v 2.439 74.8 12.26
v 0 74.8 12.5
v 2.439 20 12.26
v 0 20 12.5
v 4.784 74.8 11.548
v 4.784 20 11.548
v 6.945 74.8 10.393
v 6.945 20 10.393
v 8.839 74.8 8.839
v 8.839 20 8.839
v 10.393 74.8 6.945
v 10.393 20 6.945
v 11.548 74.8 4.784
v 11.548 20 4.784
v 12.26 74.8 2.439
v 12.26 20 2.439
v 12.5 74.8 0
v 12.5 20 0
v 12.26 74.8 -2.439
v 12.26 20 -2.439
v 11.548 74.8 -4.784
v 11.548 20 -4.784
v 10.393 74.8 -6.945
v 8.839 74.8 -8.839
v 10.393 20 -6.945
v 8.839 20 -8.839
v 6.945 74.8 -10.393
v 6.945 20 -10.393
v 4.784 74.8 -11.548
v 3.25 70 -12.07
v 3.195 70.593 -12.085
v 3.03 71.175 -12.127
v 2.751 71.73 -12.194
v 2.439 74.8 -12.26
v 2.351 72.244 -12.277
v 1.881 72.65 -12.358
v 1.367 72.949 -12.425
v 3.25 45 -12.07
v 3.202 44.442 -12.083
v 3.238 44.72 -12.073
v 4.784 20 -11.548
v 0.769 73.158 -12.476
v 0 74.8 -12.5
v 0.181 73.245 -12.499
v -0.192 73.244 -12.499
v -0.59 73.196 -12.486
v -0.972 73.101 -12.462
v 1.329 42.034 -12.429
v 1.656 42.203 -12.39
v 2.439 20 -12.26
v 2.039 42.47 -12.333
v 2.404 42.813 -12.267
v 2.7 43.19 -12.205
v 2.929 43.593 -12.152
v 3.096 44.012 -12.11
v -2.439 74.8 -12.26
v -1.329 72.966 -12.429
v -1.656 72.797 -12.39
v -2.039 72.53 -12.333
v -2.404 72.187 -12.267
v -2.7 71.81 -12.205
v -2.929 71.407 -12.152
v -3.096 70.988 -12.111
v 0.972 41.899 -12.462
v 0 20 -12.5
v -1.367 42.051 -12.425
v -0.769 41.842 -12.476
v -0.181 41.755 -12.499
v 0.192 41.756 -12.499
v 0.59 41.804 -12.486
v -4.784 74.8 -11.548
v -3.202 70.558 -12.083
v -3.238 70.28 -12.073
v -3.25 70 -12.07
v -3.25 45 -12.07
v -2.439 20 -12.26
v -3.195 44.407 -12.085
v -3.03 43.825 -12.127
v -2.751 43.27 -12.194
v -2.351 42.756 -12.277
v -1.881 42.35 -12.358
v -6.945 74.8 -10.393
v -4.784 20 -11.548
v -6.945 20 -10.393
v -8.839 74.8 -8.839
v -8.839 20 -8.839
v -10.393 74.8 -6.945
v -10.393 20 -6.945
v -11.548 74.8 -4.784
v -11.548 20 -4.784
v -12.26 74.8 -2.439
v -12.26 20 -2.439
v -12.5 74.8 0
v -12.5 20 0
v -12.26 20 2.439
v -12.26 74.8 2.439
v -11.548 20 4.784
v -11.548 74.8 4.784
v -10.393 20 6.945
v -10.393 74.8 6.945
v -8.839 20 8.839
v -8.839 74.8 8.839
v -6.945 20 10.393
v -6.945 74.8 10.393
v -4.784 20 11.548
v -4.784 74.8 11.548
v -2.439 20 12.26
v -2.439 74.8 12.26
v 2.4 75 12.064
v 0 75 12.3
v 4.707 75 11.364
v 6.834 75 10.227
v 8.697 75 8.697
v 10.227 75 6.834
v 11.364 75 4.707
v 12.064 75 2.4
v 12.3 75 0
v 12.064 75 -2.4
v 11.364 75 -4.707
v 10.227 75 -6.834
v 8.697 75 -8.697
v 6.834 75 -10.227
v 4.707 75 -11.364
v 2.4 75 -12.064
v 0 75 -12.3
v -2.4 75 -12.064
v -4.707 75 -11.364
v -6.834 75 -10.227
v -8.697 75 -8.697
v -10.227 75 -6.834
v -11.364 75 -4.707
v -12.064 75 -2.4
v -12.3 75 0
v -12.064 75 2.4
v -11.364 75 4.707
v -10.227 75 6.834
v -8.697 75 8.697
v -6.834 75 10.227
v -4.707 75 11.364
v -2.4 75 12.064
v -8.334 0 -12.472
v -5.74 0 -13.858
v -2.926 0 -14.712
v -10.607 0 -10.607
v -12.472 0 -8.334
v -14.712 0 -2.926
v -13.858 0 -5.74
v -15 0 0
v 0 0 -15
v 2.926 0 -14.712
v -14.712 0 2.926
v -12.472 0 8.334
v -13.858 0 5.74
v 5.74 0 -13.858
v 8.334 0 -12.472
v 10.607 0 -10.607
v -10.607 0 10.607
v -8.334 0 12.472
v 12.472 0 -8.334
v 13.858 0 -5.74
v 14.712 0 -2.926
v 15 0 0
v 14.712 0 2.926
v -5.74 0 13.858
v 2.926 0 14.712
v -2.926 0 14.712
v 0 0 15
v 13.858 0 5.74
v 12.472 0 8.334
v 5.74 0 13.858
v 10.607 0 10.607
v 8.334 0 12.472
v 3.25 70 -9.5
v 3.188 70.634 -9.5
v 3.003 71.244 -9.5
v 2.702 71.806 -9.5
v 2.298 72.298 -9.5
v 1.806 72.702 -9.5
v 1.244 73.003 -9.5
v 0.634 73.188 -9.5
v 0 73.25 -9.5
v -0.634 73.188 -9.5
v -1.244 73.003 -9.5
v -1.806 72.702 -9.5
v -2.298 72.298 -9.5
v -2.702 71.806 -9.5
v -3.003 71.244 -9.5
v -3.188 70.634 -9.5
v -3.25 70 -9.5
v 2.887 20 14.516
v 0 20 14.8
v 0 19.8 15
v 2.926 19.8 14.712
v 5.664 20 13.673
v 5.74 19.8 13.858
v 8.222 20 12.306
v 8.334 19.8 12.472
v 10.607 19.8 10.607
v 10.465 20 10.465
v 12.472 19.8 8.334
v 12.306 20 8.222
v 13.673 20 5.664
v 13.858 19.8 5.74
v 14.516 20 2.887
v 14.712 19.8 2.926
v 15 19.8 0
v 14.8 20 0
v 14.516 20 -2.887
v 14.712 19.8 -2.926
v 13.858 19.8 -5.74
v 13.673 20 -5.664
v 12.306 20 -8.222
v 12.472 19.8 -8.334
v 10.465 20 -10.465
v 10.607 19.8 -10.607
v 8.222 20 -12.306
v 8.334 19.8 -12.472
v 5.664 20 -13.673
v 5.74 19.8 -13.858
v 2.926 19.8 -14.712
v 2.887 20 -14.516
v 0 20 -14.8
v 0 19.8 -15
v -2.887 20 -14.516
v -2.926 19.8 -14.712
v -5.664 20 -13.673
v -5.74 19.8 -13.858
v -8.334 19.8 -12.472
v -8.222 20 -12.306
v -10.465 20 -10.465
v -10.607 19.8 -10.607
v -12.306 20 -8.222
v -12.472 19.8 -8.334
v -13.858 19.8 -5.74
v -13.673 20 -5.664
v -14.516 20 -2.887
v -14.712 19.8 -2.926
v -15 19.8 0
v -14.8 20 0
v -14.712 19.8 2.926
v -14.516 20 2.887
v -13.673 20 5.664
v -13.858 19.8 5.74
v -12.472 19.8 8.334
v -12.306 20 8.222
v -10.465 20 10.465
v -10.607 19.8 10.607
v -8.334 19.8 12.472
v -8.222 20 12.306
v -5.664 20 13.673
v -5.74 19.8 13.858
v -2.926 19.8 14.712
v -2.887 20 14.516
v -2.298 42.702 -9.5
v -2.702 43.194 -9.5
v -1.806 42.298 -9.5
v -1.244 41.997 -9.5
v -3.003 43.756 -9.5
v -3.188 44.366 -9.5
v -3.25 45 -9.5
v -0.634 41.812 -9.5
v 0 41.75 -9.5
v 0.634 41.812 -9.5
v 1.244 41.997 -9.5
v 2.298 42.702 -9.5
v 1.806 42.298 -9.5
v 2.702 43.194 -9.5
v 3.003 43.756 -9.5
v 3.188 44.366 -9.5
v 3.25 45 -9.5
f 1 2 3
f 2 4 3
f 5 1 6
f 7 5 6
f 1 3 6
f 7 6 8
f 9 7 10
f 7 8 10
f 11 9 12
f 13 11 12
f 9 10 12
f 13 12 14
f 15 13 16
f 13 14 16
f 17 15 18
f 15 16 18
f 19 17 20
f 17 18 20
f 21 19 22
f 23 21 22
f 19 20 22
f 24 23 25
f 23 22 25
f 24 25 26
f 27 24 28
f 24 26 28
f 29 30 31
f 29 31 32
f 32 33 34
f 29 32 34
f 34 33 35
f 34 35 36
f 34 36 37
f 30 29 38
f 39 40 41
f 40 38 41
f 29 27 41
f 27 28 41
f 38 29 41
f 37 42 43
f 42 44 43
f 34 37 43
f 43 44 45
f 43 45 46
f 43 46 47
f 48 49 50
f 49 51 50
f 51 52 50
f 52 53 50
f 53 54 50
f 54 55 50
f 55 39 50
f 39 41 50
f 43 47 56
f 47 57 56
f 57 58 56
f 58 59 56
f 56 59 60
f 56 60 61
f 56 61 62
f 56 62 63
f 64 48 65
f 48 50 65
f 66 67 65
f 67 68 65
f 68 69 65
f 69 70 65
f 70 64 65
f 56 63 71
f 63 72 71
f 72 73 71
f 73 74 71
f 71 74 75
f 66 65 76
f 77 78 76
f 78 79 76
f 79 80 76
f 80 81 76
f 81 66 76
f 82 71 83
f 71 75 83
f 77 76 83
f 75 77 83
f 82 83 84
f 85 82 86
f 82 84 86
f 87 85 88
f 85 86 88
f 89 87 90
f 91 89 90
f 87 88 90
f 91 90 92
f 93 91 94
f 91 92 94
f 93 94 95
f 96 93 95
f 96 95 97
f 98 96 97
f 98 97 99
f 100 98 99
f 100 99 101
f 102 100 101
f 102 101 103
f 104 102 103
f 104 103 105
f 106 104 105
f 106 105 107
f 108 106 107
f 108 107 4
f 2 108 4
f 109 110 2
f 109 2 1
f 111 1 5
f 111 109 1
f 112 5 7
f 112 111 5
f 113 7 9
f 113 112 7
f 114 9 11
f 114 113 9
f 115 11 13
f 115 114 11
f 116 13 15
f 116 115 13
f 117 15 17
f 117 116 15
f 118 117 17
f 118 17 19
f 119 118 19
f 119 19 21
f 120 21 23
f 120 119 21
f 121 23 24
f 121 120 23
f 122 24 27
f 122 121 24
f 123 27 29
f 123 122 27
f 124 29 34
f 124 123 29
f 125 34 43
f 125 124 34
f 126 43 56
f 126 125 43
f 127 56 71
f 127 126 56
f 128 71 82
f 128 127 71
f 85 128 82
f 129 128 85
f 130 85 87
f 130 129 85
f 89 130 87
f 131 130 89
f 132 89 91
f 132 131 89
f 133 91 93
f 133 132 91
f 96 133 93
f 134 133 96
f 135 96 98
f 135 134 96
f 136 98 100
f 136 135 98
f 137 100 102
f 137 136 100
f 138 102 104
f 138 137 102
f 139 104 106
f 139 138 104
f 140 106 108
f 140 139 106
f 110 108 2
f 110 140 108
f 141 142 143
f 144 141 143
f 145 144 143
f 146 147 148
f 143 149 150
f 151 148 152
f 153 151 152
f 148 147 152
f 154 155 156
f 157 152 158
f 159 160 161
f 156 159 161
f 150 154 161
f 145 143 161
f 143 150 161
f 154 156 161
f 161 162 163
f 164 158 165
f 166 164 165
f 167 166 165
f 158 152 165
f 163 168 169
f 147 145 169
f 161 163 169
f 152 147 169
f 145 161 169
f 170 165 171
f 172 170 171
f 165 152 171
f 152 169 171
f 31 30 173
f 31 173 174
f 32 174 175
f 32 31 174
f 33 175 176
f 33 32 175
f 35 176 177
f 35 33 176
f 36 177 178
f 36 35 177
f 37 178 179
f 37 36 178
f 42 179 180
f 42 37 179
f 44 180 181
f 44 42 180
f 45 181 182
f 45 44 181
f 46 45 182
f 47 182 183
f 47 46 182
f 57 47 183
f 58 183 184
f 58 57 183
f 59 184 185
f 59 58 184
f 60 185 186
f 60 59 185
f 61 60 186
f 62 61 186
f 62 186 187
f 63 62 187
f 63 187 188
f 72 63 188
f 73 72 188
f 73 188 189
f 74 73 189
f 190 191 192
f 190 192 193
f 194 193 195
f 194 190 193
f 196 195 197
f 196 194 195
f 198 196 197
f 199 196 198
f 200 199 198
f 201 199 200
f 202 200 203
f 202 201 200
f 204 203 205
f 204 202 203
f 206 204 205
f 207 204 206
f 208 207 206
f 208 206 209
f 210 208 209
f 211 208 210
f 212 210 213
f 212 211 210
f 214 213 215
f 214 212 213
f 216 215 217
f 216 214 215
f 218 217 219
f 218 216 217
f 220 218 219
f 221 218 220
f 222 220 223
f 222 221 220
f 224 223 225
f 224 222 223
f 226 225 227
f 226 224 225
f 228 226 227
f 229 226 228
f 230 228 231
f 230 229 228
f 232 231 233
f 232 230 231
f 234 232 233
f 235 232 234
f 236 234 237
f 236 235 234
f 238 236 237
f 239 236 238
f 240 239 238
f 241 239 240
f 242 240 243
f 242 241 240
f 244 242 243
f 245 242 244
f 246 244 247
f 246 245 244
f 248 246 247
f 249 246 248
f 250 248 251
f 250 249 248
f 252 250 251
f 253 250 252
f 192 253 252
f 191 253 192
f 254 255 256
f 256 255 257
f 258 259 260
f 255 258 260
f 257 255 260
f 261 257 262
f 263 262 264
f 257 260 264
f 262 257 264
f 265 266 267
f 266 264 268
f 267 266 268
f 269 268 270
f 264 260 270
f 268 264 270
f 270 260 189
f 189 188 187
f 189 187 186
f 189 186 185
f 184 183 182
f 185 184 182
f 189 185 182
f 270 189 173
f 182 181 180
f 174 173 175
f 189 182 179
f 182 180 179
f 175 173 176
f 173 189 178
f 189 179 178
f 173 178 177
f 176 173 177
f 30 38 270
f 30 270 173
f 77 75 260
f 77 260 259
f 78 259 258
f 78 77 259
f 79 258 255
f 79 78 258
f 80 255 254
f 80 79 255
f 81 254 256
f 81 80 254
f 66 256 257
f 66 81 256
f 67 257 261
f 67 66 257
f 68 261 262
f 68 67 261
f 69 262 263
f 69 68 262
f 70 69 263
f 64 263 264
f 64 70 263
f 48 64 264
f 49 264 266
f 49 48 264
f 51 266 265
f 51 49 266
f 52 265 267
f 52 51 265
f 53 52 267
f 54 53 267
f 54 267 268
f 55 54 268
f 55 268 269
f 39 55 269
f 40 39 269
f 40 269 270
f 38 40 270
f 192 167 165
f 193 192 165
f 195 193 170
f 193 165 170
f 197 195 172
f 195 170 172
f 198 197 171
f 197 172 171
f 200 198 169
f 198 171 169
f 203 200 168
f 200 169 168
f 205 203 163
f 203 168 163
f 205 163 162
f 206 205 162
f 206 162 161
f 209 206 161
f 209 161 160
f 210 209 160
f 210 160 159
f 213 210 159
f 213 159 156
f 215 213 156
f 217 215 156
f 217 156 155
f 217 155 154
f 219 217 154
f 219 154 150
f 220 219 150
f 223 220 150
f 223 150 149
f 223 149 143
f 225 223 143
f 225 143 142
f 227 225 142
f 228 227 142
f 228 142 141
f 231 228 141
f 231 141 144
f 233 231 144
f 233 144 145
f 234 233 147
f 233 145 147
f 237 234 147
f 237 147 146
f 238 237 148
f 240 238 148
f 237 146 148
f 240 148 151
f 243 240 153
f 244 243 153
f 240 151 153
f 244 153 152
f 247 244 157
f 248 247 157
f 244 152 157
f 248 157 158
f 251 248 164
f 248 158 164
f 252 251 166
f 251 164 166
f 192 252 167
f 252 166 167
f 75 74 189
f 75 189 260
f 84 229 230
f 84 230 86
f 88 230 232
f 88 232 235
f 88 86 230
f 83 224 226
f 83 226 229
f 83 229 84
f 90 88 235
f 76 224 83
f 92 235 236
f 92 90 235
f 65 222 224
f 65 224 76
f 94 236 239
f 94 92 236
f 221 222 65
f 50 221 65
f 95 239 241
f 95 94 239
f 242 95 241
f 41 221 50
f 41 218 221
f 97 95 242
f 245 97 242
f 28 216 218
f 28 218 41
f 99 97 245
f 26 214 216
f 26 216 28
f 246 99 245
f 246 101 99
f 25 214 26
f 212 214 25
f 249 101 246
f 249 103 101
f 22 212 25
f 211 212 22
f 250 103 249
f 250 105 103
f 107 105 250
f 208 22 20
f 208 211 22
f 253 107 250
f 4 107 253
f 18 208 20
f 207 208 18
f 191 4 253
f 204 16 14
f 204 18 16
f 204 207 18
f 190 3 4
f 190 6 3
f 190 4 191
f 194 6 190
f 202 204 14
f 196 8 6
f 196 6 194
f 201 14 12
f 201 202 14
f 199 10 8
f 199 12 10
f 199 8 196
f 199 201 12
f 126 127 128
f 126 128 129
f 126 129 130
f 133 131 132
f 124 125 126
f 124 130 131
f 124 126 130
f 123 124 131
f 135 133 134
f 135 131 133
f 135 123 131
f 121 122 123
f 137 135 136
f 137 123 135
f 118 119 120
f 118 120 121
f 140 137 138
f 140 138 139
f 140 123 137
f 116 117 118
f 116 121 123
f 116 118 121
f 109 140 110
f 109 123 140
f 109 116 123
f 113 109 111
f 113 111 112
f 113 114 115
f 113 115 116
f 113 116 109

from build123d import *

# Parameters (mm, degrees)
ESQUISSE1_R             = 15
BOSS_EXTRU_1_DEPTH      = 75
ENL_V_START             = -55
ESQUISSE2_R             = 15
ESQUISSE2_R_2           = 12.5
ENL_V_MAT_EXTRU_1_DEPTH = 55
CHANFREIN4_SIZE         = 0.2
CHANFREIN5_SIZE         = 0.2
ENL_V_MAT_EXTRU_2_DEPTH = 3


with BuildPart() as part:
    # Esquisse1 → Boss.-Extru.1 (new body)
    with BuildSketch(Plane(origin=(0, 0, 0), x_dir=(1, 0, 0), z_dir=(0, 1, 0))):
        with Locations(Location((0, 0, 0), (0, 0, 270))):
            Circle(ESQUISSE1_R)
    extrude(amount=BOSS_EXTRU_1_DEPTH)

    # Esquisse2 → Enlèv. mat.-Extru.1 (cut)
    with BuildSketch(Plane(origin=(0, 75, 0), x_dir=(1, 0, 0), z_dir=(0, 1, 0)).offset(ENL_V_START)):
        with Locations(Location((0, 0, 0), (0, 0, 270))):
            Circle(ESQUISSE2_R)
        with Locations(Location((0, 0, 0), (0, 0, 270))):
            Circle(ESQUISSE2_R_2, mode=Mode.SUBTRACT)
    extrude(amount=ENL_V_MAT_EXTRU_1_DEPTH, mode=Mode.SUBTRACT)

    # Chanfrein4
    chanfrein4_edges = [part.edges().sort_by_distance(p)[0] for p in [
        (0, 20, -15),
    ]]
    chamfer(chanfrein4_edges, length=CHANFREIN4_SIZE)

    # Chanfrein5
    chanfrein5_edges = [part.edges().sort_by_distance(p)[0] for p in [
        (0, 75, -12.5),
    ]]
    chamfer(chanfrein5_edges, length=CHANFREIN5_SIZE)

    # Esquisse3 → Enlèv. mat.-Extru.2 (cut)
    with BuildSketch(Plane(origin=(0, 0, -12.5), x_dir=(-1, 0, 0), z_dir=(0, 0, -1))):
        with BuildLine():
            Line((3.25, 70), (3.25, 45))
            ThreePointArc((3.25, 45), (0, 41.75), (-3.25, 45))
            Line((-3.25, 45), (-3.25, 70))
            ThreePointArc((-3.25, 70), (0, 73.25), (3.25, 70))
        make_face()
    extrude(amount=-ENL_V_MAT_EXTRU_2_DEPTH, mode=Mode.SUBTRACT)


solid = part.part
